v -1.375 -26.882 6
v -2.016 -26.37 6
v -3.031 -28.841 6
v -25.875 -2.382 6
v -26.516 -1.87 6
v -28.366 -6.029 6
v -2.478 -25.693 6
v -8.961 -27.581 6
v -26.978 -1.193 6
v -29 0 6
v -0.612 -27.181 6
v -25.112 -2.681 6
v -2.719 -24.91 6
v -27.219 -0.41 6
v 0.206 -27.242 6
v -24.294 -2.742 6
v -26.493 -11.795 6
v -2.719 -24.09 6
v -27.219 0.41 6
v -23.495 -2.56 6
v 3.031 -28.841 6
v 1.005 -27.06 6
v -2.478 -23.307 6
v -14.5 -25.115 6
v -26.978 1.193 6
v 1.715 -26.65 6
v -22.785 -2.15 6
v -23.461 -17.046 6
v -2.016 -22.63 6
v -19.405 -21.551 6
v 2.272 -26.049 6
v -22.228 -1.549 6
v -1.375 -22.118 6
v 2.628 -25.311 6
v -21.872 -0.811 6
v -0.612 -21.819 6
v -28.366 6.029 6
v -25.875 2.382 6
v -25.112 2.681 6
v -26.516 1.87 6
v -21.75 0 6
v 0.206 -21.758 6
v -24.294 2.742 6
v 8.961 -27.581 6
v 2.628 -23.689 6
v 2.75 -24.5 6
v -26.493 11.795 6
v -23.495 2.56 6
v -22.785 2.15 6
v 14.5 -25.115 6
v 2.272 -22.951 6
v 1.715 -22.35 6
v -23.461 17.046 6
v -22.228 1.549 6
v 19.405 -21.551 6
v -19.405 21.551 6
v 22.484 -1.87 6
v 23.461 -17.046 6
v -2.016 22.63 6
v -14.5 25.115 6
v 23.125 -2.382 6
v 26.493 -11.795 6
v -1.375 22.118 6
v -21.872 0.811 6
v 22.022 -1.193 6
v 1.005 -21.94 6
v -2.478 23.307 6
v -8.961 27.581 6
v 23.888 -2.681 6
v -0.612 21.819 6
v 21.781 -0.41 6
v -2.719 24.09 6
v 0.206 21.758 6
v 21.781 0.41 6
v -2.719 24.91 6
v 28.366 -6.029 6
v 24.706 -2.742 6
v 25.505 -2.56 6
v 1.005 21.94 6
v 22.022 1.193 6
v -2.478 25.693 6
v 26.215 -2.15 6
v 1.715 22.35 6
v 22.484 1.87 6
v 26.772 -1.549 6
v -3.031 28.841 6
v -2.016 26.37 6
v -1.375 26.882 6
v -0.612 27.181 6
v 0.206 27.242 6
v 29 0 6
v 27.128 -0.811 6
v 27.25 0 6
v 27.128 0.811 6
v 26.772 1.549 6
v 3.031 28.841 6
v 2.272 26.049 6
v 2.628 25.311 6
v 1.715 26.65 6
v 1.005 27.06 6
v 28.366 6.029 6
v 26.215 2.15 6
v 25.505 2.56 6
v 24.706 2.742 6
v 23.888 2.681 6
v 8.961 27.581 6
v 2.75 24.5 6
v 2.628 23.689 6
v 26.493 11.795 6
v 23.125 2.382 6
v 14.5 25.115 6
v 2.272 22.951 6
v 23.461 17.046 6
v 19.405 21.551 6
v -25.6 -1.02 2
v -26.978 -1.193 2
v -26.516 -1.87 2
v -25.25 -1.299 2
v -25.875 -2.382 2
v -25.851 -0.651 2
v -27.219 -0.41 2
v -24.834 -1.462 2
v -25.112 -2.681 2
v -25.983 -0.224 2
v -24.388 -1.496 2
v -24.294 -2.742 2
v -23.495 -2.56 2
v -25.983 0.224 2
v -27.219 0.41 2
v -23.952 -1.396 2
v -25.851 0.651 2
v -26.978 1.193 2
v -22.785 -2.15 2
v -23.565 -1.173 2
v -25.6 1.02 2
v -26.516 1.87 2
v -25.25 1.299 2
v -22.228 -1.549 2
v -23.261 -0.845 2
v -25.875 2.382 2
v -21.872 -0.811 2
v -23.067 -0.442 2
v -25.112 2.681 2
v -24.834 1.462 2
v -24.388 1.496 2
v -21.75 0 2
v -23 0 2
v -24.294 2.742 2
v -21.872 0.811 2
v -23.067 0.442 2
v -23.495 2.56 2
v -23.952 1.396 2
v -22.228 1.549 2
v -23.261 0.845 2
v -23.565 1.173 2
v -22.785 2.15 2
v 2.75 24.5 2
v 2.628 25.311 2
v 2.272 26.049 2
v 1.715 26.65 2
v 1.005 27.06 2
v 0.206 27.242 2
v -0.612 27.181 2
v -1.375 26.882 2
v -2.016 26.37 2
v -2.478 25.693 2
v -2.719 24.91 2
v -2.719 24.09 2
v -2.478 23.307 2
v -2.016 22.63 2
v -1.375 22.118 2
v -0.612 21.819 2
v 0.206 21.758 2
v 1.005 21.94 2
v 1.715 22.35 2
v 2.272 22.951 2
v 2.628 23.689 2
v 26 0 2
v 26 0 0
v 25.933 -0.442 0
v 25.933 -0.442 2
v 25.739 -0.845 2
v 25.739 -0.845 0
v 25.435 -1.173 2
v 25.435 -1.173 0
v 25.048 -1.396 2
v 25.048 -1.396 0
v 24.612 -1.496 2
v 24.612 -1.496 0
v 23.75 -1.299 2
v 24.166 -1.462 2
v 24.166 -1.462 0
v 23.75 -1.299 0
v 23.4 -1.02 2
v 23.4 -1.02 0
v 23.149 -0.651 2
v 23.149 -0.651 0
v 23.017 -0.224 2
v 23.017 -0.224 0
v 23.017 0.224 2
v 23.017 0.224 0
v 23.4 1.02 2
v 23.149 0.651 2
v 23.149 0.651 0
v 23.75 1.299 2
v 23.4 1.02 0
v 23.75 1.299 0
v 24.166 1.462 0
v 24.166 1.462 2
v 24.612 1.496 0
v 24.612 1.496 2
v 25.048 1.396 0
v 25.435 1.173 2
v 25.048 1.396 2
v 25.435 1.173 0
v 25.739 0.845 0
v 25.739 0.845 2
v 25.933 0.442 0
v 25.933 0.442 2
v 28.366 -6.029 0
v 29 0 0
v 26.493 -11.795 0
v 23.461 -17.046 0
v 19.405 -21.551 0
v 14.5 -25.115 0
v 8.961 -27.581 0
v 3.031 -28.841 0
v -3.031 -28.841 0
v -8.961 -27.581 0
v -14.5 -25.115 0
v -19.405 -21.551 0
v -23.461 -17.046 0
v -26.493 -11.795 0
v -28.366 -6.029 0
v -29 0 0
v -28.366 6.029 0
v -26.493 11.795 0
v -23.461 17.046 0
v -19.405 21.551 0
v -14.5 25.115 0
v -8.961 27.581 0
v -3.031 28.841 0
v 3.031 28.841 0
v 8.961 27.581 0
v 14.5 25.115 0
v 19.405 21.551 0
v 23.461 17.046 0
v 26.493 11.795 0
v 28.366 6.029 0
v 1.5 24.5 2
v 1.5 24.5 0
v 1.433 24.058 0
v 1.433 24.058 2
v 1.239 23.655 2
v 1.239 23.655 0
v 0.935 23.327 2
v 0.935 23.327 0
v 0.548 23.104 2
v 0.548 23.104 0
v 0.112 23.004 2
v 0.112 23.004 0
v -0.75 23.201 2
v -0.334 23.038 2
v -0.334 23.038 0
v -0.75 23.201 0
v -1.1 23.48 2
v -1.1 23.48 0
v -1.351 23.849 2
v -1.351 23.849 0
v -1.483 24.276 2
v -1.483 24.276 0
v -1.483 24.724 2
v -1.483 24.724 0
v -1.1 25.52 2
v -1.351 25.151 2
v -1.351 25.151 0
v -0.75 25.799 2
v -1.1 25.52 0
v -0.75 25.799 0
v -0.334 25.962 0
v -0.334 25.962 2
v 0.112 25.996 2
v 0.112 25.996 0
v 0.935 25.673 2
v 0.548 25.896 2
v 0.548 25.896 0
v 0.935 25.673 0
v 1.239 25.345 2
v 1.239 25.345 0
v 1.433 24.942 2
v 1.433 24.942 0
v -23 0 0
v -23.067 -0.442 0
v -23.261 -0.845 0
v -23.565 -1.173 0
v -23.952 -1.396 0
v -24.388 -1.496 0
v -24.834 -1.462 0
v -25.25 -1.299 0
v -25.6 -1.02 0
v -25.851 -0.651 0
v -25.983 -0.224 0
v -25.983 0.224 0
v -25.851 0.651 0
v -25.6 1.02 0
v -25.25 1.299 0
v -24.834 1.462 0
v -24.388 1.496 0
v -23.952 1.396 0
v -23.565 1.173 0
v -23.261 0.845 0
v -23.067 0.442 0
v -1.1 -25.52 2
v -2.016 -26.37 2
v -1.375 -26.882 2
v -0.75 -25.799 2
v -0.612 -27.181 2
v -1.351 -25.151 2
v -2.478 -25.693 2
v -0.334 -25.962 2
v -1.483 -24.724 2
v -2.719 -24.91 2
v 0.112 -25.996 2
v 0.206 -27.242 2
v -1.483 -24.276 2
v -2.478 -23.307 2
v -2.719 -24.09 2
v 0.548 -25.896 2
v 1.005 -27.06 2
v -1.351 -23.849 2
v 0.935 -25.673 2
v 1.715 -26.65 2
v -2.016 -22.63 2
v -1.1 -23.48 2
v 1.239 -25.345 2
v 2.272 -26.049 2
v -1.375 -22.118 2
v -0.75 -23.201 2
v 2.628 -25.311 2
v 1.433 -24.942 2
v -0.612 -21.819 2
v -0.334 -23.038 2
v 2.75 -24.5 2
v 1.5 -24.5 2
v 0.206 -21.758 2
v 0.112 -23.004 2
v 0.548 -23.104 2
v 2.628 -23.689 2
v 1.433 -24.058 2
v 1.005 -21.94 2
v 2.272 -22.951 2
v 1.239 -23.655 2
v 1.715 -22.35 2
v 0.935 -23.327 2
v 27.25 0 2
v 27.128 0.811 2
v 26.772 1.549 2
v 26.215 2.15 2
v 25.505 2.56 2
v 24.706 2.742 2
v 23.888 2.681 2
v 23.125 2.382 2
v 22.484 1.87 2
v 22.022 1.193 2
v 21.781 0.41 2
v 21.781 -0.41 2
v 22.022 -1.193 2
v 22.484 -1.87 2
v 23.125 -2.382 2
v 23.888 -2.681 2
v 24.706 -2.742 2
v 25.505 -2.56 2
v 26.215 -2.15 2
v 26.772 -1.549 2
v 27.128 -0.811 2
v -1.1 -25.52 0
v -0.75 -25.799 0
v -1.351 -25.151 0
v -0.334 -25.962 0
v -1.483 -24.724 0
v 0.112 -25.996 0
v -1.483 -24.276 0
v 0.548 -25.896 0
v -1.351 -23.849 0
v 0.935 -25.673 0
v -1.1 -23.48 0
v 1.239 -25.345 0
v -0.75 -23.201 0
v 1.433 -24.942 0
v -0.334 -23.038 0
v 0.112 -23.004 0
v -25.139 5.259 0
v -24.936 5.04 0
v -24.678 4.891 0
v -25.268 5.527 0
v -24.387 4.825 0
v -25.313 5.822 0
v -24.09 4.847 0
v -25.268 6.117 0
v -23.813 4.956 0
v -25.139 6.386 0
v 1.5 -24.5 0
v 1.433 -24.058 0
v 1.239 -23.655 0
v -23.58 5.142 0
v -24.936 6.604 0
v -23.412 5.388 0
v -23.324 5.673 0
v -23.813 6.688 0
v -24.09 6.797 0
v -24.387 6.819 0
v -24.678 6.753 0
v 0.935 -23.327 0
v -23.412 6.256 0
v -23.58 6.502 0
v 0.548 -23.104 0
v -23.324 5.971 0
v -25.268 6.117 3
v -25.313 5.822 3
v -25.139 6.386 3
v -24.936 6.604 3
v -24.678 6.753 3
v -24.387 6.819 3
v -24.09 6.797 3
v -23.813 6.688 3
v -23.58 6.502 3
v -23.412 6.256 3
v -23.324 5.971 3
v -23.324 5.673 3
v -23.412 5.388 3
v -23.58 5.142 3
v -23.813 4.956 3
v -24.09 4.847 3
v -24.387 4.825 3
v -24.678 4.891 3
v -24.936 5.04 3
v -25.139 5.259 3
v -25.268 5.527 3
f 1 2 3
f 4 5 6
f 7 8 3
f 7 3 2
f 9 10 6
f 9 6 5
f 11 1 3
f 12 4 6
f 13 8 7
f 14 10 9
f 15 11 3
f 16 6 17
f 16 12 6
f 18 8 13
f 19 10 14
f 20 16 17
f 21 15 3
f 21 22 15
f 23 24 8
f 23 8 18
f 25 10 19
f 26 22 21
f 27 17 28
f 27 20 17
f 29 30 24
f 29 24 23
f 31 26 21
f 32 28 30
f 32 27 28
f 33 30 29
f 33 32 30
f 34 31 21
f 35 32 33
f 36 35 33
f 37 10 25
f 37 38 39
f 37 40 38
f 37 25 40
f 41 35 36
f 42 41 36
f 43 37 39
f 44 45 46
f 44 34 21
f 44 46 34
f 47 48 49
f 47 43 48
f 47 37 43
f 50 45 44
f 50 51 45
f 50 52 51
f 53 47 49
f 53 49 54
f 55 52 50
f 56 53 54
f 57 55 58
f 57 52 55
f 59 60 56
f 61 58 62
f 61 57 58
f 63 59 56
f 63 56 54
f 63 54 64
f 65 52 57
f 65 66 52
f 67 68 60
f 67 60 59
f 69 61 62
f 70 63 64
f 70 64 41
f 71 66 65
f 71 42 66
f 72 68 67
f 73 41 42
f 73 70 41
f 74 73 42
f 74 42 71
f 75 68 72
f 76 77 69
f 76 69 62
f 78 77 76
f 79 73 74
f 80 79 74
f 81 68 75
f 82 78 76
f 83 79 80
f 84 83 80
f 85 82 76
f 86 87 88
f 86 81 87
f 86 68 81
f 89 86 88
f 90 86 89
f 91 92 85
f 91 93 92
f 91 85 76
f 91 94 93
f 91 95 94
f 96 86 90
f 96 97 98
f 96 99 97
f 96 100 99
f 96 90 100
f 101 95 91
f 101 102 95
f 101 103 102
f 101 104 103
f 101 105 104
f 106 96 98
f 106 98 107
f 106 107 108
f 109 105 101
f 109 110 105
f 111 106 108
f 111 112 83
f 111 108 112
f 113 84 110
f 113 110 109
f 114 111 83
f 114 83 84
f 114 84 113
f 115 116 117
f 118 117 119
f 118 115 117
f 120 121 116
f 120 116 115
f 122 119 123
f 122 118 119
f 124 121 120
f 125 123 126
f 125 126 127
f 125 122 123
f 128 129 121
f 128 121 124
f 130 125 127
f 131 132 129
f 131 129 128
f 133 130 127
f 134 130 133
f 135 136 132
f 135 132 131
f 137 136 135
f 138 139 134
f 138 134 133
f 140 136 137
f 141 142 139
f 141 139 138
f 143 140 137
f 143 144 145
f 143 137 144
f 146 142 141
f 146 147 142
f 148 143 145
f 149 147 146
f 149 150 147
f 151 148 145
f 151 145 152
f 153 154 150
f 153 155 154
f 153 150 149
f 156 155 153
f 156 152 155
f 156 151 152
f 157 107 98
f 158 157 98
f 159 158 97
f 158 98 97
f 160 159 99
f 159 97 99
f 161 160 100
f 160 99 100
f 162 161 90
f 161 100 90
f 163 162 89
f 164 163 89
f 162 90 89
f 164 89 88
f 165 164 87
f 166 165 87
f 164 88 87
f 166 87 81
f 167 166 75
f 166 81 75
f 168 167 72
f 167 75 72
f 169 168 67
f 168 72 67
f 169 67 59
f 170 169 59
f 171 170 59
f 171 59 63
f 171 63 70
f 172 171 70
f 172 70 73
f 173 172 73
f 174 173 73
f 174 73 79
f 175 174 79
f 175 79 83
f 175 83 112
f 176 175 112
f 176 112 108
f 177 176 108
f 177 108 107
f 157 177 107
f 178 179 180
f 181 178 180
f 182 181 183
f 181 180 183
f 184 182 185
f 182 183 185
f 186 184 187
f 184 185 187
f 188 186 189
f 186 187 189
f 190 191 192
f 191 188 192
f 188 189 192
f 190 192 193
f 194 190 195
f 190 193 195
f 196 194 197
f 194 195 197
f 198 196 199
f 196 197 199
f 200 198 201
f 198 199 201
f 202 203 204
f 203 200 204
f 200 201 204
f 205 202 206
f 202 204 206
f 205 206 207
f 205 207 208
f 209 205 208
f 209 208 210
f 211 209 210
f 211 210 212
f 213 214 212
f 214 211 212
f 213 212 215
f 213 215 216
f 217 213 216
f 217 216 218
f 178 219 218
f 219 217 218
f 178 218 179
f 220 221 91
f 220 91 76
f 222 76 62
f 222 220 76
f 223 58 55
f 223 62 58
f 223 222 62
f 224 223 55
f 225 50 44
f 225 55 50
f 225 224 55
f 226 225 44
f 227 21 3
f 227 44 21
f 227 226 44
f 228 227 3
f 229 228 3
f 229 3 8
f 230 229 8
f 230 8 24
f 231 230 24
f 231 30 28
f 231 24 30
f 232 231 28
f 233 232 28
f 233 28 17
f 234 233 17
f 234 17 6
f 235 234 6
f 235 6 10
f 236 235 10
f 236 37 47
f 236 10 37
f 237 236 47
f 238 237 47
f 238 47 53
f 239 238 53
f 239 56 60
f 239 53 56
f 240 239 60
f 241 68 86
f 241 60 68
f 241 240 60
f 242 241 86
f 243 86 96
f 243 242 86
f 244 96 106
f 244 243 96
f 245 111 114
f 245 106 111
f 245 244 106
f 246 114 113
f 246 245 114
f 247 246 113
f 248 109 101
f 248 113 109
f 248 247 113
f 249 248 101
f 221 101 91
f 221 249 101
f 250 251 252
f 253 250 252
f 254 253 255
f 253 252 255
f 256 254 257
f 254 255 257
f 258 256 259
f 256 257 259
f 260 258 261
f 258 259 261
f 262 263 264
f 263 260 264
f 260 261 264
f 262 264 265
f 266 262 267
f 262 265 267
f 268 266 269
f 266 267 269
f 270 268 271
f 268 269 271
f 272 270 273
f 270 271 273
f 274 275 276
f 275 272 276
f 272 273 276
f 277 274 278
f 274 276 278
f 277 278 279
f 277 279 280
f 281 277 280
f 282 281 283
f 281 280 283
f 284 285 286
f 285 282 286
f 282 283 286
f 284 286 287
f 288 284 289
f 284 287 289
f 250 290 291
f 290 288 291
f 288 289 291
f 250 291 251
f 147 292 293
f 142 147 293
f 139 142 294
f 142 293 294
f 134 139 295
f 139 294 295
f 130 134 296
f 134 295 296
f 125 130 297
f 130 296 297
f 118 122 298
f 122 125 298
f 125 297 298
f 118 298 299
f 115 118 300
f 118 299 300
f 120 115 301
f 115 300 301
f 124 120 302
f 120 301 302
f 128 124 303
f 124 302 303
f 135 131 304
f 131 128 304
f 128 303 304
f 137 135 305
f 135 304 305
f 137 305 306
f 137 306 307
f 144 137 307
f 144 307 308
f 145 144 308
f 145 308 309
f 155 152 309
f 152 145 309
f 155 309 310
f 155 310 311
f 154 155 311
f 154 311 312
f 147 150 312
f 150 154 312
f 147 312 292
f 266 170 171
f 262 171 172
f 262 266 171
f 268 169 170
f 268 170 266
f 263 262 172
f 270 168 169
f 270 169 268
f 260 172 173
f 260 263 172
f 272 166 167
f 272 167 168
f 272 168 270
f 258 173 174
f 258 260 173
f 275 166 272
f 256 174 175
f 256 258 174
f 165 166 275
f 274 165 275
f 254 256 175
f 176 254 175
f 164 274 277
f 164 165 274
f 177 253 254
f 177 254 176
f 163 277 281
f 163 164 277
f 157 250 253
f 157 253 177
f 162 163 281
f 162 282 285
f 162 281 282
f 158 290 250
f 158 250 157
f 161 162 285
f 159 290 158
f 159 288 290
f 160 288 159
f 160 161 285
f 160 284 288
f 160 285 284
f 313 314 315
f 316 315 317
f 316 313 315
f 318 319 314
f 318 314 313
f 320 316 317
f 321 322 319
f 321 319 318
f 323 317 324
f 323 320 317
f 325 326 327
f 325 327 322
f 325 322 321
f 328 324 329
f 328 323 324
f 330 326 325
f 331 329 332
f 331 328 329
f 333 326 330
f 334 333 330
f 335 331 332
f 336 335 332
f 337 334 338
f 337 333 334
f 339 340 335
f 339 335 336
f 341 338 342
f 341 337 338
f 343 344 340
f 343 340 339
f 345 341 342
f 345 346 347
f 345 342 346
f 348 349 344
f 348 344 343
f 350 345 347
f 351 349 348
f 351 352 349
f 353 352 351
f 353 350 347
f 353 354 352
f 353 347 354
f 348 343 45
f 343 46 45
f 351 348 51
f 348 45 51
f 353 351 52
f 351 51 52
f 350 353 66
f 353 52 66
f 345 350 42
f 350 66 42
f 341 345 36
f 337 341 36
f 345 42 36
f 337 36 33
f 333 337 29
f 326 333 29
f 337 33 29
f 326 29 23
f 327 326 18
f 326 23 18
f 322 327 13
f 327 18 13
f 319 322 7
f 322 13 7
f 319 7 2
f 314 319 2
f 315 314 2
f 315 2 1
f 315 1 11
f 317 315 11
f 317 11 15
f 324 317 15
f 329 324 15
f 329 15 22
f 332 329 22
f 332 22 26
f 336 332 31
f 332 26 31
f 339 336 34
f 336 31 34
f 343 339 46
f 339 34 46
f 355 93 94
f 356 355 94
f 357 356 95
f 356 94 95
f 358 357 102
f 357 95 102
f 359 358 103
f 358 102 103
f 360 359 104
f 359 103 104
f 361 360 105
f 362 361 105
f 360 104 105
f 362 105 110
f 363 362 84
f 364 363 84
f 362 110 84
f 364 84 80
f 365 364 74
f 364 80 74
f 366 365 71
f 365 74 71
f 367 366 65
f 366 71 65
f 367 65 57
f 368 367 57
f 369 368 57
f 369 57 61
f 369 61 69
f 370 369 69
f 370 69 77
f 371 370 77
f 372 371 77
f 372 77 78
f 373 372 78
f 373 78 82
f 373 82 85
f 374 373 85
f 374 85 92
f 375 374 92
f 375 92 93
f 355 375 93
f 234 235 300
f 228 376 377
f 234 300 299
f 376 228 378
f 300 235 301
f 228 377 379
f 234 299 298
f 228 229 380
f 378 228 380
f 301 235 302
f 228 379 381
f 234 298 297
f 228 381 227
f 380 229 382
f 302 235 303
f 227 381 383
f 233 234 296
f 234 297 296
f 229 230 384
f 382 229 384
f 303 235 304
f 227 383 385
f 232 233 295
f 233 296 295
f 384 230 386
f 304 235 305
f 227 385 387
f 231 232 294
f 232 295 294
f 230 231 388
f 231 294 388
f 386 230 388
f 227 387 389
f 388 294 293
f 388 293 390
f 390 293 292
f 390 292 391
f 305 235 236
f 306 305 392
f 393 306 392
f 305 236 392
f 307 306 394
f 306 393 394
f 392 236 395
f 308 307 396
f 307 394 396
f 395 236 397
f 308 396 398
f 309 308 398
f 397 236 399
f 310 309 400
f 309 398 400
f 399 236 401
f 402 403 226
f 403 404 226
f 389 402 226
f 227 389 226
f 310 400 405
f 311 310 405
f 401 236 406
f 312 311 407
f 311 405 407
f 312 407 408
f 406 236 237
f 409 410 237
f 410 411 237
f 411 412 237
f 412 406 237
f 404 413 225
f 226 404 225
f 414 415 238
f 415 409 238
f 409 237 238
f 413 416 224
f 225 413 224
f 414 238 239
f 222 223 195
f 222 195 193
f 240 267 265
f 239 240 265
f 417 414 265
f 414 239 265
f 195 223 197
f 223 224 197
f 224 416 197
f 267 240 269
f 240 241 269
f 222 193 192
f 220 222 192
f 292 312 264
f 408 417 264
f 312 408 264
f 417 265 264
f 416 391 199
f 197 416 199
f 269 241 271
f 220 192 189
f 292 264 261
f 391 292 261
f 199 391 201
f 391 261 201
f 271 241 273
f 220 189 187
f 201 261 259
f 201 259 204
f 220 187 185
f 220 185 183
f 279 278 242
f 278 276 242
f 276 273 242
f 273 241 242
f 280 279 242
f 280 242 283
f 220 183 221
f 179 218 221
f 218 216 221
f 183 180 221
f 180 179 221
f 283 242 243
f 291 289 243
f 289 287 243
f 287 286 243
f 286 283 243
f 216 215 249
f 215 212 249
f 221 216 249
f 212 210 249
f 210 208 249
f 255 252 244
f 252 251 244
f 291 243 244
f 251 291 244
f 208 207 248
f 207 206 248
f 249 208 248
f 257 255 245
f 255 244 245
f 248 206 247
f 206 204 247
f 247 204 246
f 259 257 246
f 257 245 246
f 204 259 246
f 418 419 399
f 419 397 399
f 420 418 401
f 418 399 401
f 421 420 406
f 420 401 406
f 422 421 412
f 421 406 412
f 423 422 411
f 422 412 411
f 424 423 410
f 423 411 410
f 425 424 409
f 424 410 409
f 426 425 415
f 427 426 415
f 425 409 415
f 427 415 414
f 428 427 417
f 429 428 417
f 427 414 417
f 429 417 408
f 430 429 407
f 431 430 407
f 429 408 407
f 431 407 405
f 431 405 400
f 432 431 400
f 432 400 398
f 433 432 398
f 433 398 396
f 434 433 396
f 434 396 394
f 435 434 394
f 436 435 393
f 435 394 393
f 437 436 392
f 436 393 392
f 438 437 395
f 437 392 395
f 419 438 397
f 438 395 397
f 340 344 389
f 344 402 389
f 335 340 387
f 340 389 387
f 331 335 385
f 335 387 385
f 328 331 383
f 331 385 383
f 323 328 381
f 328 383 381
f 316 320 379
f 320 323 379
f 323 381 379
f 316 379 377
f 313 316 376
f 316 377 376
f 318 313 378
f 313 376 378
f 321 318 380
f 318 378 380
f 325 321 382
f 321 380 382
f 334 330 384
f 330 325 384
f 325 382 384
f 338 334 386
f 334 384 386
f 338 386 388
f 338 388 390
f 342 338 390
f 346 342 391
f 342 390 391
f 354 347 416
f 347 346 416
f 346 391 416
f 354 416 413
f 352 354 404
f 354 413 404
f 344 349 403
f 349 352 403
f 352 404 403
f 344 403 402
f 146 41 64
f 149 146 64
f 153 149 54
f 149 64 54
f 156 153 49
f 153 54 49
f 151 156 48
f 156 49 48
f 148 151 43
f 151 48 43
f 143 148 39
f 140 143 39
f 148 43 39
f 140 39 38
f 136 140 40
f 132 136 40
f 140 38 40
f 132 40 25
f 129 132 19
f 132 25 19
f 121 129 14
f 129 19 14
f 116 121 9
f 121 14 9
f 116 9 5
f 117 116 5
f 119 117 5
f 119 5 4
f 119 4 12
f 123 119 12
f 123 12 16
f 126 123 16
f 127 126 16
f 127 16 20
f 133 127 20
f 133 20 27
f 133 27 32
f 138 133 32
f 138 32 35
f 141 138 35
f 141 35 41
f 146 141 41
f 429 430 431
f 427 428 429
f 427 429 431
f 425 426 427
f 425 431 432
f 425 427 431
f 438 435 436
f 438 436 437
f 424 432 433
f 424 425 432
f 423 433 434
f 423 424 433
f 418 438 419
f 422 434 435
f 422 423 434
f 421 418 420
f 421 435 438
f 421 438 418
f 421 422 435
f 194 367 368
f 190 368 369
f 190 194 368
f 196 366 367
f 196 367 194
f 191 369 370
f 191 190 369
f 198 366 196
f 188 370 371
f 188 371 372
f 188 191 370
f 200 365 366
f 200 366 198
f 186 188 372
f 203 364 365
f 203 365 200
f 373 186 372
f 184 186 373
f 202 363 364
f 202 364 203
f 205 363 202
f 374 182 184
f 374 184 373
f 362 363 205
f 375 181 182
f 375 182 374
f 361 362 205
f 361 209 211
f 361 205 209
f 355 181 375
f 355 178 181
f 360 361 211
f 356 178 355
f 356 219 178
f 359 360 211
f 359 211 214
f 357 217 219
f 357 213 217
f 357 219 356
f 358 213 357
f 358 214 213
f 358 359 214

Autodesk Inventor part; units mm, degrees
ref_plane "YZ Plane" through (0, 0, 0) normal (1, 0, 0) x (0, 1, 0)
ref_plane "XZ Plane" through (0, 0, 0) normal (0, 1, 0) x (-1, 0, 0)
ref_plane "XY Plane" through (0, 0, 0) normal (0, 0, 1) x (1, 0, 0)
sketch "스케치1" plane through (0, 0, 0) normal (0, 0, 1) x (1, 0, 0)
  circle A0 centre (0, 0) radius 29
  circle A1 centre (-24.5, 0) radius 1.5
  circle A2 centre (-24.5, 0) radius 2.75
  circle A3 centre (0, -24.5) radius 1.5
  circle A4 centre (0, -24.5) radius 2.75
  circle A5 centre (24.5, 0) radius 1.5
  circle A6 centre (24.5, 0) radius 2.75
  circle A7 centre (0, 24.5) radius 1.5
  circle A8 centre (0, 24.5) radius 2.75
  dimension "d0" = 58
  dimension "d1" = 3
  dimension "d2" = 5.5
  dimension "d3" = 24.5
  dimension "d6" = 360
extrude "돌출1" add sketch "스케치1" along normal blind 6 contours A0 | A2 | A4 | A6 | A8
sketch "스케치2" plane through (0, 0, 6) normal (0, 0, 1) x (1, 0, 0)
  circle A0 centre (0, 24.5) radius 1.5 projected
  circle A1 centre (24.5, 0) radius 1.5 projected
  circle A2 centre (0, -24.5) radius 1.5 projected
  circle A3 centre (-24.5, 0) radius 1.5 projected
  circle A4 centre (-24.5, 0) radius 2.75 projected
  circle A5 centre (24.5, 0) radius 2.75 projected
  circle A6 centre (0, -24.5) radius 2.75 projected
  circle A7 centre (0, 24.5) radius 2.75 projected
extrude "돌출2" cut sketch "스케치2" against normal blind 4
sketch "스케치5" plane through (0, 0, 0) normal (0, 0, -1) x (-1, 0, 0)
  circle A0 centre (0, 0) radius 65 projected
  circle A1 centre (7.157, 23.4313) radius 1 projected
  line L0 (22.2881, 36.3872) -> (18.0584, 32.156) projected
  arc A2 (18.0584, 32.156) -> (18.0588, 29.3276) centre (19.4728, 30.742) ccw projected
  line L1 (18.0588, 29.3276) -> (29.3745, 18.0158) projected
  arc A3 (29.3745, 18.0158) -> (32.2029, 18.0163) centre (30.7884, 19.4302) ccw projected
  line L2 (32.2029, 18.0163) -> (36.4326, 22.2474) projected
  arc A4 (36.4326, 22.2474) -> (36.4322, 25.0758) centre (35.0182, 23.6614) ccw projected
  line L3 (36.4322, 25.0758) -> (25.1165, 36.3876) projected
  arc A5 (25.1165, 36.3876) -> (22.2881, 36.3872) centre (23.7025, 34.9732) ccw projected
  circle A6 centre (0, 24.5) radius 1.2295 projected
  circle A7 centre (-24.5, 0) radius 1.2295 projected
  circle A8 centre (0, -24.5) radius 1.2295 projected
  circle A9 centre (24.5, 0) radius 1.2295 projected
  circle A10 centre (0, 51.0531) radius 2.5 projected
  circle A11 centre (0, -51.0531) radius 2.5 projected
  circle A12 centre (-51.0531, 0) radius 2.5 projected
  circle A13 centre (51.0531, 0) radius 2.5 projected
  circle A14 centre (-22.9994, -55.4169) radius 1.5 projected
  circle A15 centre (55.4169, -22.9994) radius 1.5 projected
  circle A16 centre (22.9994, 55.4169) radius 1.5 projected
  circle A17 centre (-55.4169, 22.9994) radius 1.5 projected
  circle A18 centre (-22.9226, 55.4487) radius 1.5 projected
  circle A19 centre (55.4487, 22.9226) radius 1.5 projected
  circle A20 centre (22.9226, -55.4487) radius 1.5 projected
  circle A21 centre (-55.4487, -22.9226) radius 1.5 projected
  circle A22 centre (0, 0) radius 65 projected
  circle A23 centre (0, 0) radius 25
  line L4 (-20.0138, -19.9861) -> (19.9861, -20.0138) projected
  line L5 (19.9861, -20.0138) -> (20.0138, 19.9861) projected
  line L6 (20.0138, 19.9861) -> (-19.9861, 20.0138) projected
  line L7 (-19.9861, 20.0138) -> (-20.0138, -19.9861) projected
  circle A24 centre (24.3126, 5.8222) radius 1
  dimension "d14" = 50
  dimension "d15" = 2
extrude "돌출3" cut sketch "스케치5" against normal blind 3 contours A24 A23 | A23 A24
properties part number "접촉부 철판가공"
